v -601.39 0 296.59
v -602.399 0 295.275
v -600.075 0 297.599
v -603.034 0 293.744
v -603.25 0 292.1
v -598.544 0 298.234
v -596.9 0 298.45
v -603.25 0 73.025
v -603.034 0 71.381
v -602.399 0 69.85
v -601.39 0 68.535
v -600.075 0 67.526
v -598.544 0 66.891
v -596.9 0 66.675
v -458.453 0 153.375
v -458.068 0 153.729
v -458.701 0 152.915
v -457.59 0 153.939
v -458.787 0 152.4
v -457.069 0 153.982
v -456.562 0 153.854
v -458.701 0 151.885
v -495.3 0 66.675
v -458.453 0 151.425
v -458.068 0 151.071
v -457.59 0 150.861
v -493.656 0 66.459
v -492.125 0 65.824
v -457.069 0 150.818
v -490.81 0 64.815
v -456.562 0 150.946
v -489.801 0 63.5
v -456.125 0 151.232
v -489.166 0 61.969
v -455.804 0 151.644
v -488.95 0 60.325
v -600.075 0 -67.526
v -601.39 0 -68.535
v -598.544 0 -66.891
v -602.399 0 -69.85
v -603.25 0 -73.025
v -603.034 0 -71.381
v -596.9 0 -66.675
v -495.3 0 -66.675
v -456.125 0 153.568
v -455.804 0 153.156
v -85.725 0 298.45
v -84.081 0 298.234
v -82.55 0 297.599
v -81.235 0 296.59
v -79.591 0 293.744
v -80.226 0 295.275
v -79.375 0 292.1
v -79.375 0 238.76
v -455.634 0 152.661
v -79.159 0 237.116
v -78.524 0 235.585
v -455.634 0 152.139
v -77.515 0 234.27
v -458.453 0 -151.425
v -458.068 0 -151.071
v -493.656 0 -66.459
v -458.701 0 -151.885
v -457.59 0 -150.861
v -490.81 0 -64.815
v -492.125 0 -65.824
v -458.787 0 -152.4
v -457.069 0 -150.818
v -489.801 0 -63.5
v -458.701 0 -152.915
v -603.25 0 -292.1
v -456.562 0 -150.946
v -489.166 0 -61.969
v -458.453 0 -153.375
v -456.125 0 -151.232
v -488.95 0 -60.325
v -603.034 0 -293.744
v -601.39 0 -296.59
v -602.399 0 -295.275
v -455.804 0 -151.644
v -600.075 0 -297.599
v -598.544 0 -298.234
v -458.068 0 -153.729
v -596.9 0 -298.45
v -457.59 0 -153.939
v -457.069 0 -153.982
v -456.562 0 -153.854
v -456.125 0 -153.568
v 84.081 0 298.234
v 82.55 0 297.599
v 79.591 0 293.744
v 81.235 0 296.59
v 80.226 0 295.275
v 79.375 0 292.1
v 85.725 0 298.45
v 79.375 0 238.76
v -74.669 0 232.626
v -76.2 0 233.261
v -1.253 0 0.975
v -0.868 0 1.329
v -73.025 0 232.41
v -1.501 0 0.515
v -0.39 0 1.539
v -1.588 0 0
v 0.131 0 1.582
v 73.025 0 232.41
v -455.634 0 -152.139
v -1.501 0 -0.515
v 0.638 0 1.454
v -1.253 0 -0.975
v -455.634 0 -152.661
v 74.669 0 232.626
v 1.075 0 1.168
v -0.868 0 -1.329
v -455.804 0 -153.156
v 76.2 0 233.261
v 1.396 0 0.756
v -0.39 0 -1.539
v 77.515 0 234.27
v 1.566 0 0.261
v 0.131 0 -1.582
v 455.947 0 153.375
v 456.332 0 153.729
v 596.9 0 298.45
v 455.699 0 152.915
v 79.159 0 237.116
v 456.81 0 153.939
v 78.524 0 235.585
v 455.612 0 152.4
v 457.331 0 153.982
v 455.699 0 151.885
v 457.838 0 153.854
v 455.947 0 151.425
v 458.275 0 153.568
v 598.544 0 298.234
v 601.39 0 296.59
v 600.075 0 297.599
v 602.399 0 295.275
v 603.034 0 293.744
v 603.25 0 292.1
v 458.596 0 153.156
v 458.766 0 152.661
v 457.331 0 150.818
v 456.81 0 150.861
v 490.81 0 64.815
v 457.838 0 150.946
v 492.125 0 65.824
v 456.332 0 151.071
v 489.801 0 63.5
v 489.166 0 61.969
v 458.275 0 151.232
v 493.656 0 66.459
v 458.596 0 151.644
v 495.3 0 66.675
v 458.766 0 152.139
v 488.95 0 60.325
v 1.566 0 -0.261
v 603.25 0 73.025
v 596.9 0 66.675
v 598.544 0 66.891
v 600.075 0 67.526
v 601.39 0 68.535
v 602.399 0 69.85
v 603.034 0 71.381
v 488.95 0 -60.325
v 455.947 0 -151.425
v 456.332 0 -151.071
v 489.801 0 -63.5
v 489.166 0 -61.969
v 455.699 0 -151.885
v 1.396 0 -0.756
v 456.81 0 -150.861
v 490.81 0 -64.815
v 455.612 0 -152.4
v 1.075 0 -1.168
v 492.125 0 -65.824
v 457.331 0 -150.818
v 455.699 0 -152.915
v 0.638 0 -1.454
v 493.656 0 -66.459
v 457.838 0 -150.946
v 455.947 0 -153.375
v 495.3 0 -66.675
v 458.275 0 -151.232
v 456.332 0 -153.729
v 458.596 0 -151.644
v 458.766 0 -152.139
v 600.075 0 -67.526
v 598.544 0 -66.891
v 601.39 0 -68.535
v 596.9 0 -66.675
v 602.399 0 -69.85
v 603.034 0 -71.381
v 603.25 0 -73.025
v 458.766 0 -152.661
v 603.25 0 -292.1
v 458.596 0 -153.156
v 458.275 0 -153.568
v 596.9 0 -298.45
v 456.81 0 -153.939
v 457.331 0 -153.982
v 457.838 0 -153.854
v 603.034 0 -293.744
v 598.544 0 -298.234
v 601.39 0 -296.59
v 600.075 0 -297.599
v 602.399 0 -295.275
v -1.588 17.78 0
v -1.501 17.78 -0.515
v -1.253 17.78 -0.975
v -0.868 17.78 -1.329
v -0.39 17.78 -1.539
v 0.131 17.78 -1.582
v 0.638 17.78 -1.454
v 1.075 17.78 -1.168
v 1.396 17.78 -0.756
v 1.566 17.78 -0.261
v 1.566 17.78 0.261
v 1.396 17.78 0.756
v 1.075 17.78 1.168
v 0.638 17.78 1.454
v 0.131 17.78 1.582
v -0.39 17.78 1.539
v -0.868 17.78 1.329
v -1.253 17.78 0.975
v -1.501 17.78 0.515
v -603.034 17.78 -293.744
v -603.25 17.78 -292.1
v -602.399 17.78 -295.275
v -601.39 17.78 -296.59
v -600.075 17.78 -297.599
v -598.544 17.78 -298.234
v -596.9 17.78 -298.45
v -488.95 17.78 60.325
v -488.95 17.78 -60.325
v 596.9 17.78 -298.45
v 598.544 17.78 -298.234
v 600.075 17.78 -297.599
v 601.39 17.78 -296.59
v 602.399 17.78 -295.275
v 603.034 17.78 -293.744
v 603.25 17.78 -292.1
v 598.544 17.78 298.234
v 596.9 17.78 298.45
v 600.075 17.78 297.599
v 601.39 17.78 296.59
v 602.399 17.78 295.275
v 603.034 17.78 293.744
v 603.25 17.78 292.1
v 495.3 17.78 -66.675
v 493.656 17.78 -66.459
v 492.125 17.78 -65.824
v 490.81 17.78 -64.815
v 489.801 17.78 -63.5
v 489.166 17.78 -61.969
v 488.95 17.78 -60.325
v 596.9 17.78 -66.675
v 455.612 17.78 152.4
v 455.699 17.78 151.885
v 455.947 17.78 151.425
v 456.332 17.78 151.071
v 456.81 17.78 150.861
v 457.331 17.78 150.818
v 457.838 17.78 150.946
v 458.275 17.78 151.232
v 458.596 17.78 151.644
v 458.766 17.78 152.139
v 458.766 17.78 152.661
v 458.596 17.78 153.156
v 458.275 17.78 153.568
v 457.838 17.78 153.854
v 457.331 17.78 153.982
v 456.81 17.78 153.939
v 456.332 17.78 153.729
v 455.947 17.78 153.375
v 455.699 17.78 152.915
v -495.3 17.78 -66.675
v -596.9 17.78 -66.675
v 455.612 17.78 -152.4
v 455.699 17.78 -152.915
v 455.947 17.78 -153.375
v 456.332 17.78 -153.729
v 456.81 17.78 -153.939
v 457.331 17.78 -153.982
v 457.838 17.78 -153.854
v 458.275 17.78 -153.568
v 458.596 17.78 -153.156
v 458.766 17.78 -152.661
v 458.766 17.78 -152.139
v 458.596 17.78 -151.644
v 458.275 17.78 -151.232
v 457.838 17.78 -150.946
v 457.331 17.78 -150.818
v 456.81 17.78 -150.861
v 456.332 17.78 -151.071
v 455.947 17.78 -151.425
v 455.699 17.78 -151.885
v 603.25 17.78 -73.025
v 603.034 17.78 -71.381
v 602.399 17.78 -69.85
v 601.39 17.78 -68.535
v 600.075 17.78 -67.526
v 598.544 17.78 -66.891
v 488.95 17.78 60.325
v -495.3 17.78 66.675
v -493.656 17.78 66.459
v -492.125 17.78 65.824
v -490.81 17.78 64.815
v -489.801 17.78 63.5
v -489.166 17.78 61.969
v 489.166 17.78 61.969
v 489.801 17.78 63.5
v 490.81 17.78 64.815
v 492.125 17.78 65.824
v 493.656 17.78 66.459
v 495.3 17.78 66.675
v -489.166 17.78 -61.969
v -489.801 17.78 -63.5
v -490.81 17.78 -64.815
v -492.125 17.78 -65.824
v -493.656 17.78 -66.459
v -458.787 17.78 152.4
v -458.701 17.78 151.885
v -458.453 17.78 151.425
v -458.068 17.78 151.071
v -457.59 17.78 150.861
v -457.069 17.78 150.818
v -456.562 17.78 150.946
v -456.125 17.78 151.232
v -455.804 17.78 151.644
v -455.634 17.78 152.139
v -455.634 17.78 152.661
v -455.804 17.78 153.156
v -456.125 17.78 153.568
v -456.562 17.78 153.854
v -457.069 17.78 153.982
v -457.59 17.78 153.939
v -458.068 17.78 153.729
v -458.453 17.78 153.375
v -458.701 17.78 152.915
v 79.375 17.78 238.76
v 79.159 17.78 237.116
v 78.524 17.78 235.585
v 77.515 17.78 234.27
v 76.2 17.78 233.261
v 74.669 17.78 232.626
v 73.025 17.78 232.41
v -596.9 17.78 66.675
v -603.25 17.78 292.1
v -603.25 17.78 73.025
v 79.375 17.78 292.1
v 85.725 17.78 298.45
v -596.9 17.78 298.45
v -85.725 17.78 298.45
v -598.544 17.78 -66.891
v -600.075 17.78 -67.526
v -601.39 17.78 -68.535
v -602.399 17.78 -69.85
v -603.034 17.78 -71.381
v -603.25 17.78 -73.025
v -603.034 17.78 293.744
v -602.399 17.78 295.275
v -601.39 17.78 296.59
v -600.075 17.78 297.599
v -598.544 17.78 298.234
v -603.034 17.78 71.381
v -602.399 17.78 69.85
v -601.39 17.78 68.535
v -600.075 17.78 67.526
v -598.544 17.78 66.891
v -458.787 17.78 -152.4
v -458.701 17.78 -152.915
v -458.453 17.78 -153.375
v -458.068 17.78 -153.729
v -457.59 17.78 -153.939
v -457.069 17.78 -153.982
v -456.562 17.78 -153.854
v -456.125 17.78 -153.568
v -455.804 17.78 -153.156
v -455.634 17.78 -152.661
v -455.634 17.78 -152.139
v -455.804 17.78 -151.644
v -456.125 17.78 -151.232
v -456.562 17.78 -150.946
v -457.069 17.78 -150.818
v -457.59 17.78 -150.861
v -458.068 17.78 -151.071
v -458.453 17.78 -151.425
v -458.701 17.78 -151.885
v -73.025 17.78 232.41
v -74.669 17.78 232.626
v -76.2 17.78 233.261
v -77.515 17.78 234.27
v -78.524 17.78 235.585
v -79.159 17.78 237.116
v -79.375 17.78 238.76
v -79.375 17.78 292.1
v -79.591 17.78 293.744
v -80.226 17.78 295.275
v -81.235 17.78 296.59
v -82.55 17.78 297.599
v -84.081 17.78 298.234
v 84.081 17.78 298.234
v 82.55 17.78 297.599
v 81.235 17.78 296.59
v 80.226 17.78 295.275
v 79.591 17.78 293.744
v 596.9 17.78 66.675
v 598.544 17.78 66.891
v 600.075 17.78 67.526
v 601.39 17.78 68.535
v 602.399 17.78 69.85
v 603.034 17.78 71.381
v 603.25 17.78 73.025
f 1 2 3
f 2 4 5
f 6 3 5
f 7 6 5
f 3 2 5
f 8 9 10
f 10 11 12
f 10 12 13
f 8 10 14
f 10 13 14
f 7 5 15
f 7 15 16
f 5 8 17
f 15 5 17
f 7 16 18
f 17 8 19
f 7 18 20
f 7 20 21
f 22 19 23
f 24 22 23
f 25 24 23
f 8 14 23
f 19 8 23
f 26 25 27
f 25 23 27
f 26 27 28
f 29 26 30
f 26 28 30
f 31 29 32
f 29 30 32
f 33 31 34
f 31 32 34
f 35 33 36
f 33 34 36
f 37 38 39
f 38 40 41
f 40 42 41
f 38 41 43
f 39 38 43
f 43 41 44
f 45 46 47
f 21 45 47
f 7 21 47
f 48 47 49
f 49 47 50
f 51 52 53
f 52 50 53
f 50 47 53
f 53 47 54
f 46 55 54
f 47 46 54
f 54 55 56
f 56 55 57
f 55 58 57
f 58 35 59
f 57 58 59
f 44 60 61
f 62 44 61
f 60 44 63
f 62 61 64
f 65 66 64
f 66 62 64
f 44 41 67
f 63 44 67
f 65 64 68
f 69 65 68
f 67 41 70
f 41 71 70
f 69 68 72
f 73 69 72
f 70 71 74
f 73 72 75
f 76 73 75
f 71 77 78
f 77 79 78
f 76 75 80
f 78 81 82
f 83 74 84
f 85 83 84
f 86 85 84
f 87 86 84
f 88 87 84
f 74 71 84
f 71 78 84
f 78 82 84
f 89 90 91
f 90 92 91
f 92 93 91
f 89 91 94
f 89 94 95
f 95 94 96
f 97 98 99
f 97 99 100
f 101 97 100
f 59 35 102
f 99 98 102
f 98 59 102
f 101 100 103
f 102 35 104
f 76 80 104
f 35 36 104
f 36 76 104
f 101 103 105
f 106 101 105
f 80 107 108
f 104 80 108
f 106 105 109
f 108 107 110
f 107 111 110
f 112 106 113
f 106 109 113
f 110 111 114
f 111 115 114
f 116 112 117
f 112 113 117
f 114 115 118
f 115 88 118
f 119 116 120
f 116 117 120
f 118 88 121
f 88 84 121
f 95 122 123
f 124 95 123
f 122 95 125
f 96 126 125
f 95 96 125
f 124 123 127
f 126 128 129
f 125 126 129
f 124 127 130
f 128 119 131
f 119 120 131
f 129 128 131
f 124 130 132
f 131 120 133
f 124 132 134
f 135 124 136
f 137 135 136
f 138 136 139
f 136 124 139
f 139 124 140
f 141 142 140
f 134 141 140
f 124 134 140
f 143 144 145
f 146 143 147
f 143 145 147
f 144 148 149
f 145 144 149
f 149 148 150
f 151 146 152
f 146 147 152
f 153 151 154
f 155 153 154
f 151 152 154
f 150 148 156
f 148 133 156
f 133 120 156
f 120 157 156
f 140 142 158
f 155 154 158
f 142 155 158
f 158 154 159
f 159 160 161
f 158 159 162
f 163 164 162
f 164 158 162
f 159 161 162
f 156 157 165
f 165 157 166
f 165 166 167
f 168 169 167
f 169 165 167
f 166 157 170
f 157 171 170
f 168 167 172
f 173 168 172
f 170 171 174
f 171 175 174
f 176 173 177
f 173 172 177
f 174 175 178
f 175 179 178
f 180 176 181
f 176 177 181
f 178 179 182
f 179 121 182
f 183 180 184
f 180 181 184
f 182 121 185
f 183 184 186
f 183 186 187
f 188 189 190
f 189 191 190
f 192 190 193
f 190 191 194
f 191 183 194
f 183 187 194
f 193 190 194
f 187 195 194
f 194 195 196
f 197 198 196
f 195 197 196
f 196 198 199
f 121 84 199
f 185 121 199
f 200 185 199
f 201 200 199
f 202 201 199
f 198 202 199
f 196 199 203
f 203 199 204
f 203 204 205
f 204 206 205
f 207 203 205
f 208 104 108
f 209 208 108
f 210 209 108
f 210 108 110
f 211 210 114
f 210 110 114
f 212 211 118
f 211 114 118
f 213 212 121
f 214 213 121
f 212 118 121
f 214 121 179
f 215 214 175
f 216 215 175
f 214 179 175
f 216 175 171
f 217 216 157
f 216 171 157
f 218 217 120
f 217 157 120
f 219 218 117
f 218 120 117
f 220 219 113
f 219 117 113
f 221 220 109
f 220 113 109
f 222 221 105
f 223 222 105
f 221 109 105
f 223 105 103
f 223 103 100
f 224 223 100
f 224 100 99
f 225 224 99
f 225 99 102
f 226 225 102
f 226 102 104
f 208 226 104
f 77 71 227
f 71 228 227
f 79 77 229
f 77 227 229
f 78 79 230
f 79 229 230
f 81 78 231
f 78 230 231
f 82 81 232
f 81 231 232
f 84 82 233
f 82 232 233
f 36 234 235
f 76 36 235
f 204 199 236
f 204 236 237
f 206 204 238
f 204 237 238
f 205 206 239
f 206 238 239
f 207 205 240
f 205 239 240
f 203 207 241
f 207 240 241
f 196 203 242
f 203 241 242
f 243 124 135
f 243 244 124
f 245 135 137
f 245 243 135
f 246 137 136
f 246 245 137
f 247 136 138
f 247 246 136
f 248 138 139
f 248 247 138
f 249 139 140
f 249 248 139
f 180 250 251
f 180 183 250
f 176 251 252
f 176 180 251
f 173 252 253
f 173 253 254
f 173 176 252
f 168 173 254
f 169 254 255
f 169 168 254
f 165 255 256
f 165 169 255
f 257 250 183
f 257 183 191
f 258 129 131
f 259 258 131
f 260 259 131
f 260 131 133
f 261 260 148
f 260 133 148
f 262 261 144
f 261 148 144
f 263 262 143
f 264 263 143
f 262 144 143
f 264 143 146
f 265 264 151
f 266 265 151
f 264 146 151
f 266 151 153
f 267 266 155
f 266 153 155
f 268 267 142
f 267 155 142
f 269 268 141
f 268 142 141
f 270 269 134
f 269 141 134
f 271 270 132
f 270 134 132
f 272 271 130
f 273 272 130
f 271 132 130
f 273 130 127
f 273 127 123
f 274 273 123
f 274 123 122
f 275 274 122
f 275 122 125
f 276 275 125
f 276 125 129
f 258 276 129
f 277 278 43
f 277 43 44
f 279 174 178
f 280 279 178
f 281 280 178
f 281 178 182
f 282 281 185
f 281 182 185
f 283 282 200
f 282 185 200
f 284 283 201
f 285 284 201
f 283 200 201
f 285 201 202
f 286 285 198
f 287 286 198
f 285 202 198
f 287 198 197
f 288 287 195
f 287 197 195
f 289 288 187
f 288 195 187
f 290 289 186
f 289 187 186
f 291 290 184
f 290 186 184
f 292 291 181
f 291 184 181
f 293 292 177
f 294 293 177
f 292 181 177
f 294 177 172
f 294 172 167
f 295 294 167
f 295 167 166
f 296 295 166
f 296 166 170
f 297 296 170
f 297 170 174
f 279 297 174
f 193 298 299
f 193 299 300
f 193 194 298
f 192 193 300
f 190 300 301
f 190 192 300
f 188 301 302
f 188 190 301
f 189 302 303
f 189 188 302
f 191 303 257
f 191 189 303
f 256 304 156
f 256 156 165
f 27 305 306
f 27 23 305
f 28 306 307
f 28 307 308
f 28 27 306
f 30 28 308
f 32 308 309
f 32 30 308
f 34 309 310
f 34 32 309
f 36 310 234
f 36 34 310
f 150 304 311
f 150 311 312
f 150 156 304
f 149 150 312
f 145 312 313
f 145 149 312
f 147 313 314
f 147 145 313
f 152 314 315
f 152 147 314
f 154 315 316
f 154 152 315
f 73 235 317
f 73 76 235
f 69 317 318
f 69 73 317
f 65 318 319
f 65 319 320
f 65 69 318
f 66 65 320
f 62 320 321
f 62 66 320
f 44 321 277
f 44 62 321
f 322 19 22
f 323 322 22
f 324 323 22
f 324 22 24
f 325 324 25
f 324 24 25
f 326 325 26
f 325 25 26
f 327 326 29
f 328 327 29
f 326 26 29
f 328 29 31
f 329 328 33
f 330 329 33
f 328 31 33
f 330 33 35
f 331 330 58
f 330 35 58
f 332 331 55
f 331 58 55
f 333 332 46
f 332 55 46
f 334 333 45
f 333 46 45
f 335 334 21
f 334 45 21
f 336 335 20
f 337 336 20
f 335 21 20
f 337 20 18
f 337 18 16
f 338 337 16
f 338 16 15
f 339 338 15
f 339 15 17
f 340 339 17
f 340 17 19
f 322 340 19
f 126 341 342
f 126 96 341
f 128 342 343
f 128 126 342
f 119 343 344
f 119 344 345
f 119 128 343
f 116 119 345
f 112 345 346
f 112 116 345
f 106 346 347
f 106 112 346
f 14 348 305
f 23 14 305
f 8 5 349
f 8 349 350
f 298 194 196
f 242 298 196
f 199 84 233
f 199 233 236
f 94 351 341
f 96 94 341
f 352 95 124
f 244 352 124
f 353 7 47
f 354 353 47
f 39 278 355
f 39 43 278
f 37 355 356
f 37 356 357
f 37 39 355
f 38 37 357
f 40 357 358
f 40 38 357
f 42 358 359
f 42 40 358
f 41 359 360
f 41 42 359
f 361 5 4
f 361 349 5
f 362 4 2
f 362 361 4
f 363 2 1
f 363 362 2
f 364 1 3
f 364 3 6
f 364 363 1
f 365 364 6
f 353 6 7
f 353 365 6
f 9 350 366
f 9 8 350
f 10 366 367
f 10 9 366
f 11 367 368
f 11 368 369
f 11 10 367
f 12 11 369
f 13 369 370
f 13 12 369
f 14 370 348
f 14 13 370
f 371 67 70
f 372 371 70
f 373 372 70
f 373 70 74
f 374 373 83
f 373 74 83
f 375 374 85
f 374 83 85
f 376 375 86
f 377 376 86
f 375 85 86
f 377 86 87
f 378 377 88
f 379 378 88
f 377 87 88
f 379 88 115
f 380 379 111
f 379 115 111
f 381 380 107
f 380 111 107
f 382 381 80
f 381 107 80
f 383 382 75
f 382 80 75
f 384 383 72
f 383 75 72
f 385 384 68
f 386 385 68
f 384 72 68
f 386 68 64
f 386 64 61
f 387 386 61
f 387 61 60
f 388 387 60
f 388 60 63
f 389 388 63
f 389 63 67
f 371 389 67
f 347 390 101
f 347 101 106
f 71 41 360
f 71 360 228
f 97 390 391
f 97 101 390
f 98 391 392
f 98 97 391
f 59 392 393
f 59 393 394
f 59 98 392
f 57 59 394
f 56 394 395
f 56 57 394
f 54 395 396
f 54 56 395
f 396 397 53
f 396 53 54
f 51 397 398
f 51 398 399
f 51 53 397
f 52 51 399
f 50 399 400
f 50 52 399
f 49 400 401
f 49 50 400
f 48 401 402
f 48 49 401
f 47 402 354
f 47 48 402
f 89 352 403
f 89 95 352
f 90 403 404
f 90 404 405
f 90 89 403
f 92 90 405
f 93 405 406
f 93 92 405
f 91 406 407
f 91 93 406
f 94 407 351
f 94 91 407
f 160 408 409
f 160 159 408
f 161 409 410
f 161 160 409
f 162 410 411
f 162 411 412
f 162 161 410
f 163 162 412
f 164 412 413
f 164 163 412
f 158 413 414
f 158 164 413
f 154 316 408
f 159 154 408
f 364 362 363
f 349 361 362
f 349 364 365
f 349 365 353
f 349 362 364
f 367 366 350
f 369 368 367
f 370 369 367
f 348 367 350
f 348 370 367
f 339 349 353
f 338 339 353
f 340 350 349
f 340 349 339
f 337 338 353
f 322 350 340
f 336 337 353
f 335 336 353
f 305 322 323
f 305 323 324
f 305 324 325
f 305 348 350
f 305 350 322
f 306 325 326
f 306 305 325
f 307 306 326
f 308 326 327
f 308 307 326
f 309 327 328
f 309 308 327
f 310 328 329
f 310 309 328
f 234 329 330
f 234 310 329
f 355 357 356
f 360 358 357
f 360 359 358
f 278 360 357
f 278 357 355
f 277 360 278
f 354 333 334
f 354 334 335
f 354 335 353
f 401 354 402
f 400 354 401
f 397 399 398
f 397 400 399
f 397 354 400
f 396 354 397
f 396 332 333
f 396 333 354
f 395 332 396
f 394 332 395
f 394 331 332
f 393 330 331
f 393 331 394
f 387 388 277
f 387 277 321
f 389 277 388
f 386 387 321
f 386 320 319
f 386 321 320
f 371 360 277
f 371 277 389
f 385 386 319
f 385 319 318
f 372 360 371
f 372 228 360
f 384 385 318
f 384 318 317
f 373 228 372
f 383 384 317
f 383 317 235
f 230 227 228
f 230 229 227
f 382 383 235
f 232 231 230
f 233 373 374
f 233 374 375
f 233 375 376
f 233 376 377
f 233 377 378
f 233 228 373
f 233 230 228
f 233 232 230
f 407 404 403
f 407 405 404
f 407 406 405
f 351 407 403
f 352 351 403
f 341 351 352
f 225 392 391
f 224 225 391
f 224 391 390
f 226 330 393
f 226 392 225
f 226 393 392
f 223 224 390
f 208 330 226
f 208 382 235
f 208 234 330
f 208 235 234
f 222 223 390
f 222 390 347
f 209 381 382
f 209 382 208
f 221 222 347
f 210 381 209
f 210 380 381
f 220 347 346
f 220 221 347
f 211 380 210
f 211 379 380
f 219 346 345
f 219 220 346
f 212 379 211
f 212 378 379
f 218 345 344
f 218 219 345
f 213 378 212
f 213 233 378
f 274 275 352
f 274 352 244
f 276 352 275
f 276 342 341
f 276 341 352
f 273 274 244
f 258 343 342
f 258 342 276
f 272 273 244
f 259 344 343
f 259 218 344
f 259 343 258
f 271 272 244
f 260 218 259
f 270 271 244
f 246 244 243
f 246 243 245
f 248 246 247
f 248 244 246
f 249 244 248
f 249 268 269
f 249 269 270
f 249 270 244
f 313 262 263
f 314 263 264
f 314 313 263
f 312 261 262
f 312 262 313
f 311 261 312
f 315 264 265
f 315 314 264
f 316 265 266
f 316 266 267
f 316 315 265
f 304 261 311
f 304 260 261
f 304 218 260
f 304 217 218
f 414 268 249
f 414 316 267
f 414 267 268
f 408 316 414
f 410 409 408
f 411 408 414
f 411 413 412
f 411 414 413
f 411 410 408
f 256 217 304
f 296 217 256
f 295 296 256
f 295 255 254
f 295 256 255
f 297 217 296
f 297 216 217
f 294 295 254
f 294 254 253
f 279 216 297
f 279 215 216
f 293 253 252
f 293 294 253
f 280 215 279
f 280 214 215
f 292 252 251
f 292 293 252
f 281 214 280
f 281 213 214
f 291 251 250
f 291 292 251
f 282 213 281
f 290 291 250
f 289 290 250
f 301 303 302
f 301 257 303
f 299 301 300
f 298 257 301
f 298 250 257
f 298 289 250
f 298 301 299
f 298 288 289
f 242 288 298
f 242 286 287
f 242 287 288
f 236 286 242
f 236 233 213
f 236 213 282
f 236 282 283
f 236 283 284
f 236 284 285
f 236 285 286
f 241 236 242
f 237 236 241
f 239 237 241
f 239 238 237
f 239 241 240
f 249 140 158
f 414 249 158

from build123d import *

# Parameters (mm, degrees)
SKETCH1_W                    = 1206.5
SKETCH1_H                    = 596.9
BOSS_EXTRUDE1_DEPTH          = 17.78
F_1_8_0_125_DIAMETER_HOLE1_D = 3.175
FILLET1_R                    = 6.35
SKETCH4_W                    = 158.75
SKETCH4_H                    = 66.04
SKETCH4_W_2                  = 114.3
SKETCH4_H_2                  = 133.35
CUT_EXTRUDE1_DEPTH           = 18.78
FILLET2_R                    = 6.35


with BuildPart() as part:
    # Sketch1 → Boss-Extrude1 (new body)
    with BuildSketch(Plane(origin=(0, 0, 0), x_dir=(1, 0, 0), z_dir=(0, 1, 0))):
        Rectangle(SKETCH1_W, SKETCH1_H)
    extrude(amount=BOSS_EXTRUDE1_DEPTH)

    # 1/8 (0.125) Diameter Hole1 (through all)
    with Locations(Plane(origin=(0, 17.78, 0), x_dir=(1, 0, 0), z_dir=(0, 1, 0))):
        with Locations((0, 0), (457.2, 152.4), (-457.2, -152.4), (-457.2, 152.4), (457.2, -152.4)):
            Hole(F_1_8_0_125_DIAMETER_HOLE1_D / 2)

    # Fillet1
    fillet1_edges = [part.edges().sort_by_distance(p)[0] for p in [
        (603.25, 8.89, 298.45),
        (-603.25, 8.89, 298.45),
        (-603.25, 8.89, -298.45),
        (603.25, 8.89, -298.45),
    ]]
    fillet(fillet1_edges, radius=FILLET1_R)

    # Sketch4 → Cut-Extrude1 (cut, through all)
    with BuildSketch(Plane(origin=(0, 17.78, 0), x_dir=(1, 0, 0), z_dir=(0, 1, 0))):
        with Locations((0, -265.43)):
            Rectangle(SKETCH4_W, SKETCH4_H)
        with Locations((-546.1, 0)):
            Rectangle(SKETCH4_W_2, SKETCH4_H_2)
        with Locations((546.1, 0)):
            Rectangle(SKETCH4_W_2, SKETCH4_H_2)
    extrude(amount=-CUT_EXTRUDE1_DEPTH, mode=Mode.SUBTRACT)

    # Fillet2
    fillet2_edges = [part.edges().sort_by_distance(p)[0] for p in [
        (-488.95, 8.89, 66.675),
        (603.25, 8.89, -66.675),
        (603.25, 8.89, 66.675),
        (488.95, 8.89, 66.675),
        (488.95, 8.89, -66.675),
        (79.375, 8.89, 232.41),
        (79.375, 8.89, 298.45),
        (-79.375, 8.89, 298.45),
        (-79.375, 8.89, 232.41),
        (-603.25, 8.89, 66.675),
        (-603.25, 8.89, -66.675),
        (-488.95, 8.89, -66.675),
    ]]
    fillet(fillet2_edges, radius=FILLET2_R)


solid = part.part
